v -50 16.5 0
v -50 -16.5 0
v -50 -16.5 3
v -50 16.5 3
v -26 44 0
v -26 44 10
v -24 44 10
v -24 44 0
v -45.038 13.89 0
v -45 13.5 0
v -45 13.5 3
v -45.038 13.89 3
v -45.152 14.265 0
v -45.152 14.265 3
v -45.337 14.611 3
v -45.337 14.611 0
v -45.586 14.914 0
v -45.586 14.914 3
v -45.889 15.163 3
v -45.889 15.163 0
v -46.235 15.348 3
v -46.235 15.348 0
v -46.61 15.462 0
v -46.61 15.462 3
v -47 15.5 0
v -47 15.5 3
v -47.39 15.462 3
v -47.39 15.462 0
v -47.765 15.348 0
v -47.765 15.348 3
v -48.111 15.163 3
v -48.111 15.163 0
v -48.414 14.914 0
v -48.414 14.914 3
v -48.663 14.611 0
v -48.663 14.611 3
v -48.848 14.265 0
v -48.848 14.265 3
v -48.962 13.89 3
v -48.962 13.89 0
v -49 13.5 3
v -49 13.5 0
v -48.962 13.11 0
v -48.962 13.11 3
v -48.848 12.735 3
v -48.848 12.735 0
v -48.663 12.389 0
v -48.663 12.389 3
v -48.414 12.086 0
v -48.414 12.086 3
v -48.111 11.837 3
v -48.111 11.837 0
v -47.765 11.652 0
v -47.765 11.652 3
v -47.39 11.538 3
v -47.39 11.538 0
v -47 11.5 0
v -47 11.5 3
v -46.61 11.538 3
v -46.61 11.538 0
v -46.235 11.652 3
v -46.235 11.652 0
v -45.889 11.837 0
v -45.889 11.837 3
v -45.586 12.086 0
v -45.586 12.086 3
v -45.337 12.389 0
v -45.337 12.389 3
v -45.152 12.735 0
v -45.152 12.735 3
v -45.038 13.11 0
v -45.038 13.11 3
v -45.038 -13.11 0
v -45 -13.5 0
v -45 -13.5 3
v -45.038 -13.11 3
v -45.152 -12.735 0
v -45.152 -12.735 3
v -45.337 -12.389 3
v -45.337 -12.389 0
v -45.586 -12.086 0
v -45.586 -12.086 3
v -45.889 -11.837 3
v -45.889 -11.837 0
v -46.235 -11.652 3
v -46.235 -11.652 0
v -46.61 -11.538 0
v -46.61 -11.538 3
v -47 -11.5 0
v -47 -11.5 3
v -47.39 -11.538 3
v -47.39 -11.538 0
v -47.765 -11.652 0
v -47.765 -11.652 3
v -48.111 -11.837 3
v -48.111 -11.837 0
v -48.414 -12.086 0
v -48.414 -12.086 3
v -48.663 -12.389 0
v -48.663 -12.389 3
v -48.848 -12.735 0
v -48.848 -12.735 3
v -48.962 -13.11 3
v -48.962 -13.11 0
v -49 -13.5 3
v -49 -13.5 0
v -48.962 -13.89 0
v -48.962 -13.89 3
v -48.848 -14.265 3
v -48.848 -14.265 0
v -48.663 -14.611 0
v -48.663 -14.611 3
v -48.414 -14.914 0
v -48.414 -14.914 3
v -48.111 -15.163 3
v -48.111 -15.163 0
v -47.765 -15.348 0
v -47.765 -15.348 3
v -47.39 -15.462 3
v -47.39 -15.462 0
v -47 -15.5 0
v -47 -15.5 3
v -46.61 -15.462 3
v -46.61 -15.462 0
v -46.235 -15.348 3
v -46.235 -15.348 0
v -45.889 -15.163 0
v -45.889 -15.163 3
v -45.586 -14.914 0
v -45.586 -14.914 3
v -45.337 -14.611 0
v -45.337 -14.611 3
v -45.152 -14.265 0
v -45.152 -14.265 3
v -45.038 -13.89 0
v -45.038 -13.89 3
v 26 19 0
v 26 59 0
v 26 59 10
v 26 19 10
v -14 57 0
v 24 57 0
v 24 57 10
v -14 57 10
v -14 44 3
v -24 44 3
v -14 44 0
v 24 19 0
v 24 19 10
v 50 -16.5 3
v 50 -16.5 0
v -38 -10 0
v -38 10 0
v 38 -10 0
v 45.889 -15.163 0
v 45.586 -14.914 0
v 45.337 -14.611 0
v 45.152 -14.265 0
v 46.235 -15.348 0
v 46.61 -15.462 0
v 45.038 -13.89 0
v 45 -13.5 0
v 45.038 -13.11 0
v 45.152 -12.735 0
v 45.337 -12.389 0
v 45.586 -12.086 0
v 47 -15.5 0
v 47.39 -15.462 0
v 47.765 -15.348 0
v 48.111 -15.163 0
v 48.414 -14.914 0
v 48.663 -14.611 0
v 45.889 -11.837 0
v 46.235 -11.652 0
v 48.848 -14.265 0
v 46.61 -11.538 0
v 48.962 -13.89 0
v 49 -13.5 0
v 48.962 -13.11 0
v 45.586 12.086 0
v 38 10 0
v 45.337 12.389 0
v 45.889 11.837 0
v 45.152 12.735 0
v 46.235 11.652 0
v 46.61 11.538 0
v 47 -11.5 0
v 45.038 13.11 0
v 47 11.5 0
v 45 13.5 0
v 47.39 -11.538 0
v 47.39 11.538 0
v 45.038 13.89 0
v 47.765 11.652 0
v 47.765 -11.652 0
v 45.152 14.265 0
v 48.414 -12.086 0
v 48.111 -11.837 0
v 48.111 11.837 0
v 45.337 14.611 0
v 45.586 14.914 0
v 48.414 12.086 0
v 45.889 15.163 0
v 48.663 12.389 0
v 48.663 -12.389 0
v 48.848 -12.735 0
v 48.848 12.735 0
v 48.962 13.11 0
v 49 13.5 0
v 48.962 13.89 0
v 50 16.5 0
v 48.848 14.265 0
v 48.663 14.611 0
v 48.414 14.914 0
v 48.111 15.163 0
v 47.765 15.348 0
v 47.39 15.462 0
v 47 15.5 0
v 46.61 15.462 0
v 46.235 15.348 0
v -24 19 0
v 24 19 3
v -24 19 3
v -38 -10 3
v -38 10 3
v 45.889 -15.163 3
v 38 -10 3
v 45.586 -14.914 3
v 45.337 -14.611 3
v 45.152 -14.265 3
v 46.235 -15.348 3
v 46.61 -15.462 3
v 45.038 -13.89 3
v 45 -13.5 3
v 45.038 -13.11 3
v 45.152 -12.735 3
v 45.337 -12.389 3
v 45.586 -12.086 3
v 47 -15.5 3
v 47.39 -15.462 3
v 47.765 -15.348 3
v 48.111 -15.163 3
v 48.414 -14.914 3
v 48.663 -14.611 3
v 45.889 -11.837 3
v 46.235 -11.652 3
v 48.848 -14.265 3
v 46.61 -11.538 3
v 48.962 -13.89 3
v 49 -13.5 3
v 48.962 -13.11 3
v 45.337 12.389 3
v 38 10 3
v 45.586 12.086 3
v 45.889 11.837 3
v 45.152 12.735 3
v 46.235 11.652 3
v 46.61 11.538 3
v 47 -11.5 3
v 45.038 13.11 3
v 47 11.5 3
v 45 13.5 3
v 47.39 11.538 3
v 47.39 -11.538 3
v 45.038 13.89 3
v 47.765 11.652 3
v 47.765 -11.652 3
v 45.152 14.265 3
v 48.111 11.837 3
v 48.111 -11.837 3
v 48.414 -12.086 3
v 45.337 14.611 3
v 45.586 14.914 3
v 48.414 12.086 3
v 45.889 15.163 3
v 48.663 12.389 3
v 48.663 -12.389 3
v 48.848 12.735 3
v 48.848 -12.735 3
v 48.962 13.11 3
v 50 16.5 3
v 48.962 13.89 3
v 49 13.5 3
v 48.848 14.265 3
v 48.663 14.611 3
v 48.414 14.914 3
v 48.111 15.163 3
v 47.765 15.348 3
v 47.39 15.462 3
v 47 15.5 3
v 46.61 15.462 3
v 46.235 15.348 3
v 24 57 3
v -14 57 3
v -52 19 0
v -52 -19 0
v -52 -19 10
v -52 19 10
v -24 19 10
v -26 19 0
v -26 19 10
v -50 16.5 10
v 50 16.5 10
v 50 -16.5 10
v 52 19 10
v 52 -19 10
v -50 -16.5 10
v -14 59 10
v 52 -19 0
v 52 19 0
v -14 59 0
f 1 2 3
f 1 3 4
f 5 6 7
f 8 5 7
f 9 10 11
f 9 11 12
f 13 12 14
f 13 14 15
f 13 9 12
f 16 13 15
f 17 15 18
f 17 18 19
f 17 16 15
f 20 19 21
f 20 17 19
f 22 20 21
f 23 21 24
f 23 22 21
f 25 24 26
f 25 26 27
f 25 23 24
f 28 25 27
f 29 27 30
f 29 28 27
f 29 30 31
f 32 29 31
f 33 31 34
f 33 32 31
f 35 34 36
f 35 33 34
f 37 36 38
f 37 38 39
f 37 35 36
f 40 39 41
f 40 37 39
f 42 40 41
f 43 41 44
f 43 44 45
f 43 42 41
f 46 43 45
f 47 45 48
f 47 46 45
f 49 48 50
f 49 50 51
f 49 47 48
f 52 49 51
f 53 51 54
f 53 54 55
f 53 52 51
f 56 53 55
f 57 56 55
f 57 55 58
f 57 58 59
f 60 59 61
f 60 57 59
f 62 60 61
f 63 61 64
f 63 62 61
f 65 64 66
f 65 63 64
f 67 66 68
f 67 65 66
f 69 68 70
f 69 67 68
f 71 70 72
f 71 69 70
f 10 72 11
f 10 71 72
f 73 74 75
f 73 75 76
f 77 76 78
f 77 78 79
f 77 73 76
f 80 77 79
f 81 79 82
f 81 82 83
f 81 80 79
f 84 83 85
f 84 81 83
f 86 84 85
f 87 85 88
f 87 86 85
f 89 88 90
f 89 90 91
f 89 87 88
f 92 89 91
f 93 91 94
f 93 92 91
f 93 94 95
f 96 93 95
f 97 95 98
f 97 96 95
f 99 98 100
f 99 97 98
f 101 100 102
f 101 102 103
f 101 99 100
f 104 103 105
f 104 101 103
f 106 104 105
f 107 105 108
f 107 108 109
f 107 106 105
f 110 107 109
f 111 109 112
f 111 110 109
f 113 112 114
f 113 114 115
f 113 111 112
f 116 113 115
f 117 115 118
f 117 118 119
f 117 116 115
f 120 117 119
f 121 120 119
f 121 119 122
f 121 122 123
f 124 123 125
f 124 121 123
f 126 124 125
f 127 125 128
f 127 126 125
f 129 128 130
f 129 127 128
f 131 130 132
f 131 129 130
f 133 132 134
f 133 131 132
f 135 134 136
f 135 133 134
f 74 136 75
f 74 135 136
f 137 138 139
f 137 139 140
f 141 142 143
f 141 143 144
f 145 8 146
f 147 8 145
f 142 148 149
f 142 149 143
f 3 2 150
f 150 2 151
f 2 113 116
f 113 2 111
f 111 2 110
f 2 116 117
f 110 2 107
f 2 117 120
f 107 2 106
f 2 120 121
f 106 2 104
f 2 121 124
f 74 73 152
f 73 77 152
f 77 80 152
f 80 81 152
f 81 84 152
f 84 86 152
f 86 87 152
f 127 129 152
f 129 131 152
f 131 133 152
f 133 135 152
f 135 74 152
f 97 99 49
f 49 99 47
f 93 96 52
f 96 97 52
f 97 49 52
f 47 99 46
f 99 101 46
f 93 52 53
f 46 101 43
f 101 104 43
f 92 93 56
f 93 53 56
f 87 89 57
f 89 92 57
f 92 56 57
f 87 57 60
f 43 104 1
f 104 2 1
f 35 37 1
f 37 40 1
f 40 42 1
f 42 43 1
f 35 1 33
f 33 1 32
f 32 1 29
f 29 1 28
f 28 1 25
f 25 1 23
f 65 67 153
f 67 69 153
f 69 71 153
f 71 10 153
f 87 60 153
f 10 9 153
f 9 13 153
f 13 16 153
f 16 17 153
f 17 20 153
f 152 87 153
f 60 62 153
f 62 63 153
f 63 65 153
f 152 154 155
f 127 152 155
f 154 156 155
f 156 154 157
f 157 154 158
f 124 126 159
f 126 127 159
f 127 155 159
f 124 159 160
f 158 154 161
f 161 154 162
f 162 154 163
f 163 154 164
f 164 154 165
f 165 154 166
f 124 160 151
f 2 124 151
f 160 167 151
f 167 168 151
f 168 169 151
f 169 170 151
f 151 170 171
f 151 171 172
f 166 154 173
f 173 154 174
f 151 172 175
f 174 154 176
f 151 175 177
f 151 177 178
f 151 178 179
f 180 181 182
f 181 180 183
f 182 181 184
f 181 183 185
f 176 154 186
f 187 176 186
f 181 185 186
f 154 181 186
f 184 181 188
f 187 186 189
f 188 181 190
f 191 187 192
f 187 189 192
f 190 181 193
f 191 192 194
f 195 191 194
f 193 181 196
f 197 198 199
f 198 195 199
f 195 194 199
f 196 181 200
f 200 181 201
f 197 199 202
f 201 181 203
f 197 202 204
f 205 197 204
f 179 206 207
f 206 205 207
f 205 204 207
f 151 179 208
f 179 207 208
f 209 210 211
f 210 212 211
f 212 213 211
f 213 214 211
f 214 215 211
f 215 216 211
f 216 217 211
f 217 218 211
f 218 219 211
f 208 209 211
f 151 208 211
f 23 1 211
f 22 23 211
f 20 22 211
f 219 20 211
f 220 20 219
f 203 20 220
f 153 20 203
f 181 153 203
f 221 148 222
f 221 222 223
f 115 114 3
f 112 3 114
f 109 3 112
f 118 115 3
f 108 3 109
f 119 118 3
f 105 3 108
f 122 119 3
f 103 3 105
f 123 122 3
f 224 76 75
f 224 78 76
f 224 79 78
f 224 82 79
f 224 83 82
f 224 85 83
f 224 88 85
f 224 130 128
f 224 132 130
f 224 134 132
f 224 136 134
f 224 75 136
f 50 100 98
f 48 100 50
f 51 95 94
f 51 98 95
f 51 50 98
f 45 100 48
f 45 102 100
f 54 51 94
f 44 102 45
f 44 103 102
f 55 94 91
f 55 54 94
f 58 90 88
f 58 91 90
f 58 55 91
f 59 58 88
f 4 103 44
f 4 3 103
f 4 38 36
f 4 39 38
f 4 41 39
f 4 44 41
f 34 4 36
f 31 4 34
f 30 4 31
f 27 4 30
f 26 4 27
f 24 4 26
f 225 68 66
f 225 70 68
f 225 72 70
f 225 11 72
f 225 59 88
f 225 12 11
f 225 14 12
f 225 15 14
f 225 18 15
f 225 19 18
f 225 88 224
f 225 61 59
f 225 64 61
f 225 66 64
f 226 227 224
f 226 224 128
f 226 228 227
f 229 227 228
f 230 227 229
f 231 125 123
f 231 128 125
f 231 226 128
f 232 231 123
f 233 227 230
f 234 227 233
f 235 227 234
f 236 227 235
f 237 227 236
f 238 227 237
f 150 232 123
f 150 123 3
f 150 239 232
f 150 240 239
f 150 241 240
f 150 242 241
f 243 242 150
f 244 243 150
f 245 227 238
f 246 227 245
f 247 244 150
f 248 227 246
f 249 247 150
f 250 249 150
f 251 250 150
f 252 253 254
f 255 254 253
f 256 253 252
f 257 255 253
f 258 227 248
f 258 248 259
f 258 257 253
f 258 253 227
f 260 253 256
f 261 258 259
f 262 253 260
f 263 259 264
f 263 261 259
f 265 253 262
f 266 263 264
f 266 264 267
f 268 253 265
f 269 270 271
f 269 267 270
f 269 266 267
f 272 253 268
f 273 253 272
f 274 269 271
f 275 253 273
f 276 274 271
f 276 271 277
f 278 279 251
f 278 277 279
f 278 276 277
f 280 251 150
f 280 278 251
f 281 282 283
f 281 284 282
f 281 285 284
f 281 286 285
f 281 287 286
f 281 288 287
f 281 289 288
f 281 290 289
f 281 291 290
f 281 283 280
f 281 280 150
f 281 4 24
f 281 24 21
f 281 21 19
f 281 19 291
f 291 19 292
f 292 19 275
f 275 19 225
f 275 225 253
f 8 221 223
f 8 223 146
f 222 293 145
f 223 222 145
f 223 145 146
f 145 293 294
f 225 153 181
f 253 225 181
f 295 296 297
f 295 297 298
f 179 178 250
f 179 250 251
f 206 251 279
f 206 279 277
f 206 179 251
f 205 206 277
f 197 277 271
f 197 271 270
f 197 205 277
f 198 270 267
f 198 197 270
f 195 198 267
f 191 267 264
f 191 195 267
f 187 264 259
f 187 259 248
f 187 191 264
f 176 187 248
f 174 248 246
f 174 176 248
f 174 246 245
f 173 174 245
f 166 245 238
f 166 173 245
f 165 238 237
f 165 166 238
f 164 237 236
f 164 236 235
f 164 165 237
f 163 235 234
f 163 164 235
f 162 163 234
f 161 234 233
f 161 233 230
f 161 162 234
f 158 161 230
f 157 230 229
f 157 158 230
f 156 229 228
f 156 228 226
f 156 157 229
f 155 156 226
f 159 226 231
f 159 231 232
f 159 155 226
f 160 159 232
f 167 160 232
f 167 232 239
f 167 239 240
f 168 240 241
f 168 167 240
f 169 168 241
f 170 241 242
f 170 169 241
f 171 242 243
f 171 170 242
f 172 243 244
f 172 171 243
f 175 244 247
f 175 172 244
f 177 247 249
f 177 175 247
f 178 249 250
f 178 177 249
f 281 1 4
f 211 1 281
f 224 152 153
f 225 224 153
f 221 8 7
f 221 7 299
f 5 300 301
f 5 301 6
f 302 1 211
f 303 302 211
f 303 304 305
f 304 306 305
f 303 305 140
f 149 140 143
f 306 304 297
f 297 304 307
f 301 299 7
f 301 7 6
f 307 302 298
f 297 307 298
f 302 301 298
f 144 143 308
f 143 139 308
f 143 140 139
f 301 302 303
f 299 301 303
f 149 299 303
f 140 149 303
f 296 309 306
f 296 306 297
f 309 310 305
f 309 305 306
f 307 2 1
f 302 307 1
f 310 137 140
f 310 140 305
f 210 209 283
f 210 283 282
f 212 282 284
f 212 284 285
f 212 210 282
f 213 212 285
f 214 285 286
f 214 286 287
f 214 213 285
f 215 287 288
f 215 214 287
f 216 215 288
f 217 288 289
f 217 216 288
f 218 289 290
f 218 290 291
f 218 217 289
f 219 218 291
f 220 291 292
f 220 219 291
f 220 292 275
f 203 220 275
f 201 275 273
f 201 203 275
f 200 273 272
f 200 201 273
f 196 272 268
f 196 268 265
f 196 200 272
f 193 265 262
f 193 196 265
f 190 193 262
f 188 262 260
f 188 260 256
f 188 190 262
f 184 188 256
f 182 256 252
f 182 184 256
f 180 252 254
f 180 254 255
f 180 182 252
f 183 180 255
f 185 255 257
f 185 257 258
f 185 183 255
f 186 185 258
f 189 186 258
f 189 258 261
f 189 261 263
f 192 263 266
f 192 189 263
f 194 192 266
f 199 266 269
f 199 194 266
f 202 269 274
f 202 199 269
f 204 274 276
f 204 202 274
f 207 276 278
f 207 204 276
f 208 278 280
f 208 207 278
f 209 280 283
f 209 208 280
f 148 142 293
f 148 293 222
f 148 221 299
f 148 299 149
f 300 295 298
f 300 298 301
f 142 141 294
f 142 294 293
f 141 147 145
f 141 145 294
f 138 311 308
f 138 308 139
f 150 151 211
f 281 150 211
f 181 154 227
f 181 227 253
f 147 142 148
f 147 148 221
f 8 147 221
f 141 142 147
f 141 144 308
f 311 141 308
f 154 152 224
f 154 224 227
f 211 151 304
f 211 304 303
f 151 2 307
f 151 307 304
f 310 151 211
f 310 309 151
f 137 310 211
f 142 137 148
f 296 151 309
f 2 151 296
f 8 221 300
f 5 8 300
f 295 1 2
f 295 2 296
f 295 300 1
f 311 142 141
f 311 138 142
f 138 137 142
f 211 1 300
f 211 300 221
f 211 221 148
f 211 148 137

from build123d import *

# Parameters (mm, degrees)
SKETCH_W     = 100
SKETCH_H     = 33
SKETCH_R     = 2
SKETCH_W_2   = 76
SKETCH_H_2   = 20
PAD_DEPTH    = 3
PAD001_DEPTH = 3
SKETCH002_W  = 100
SKETCH002_H  = 33
PAD002_DEPTH = 10


with BuildPart() as boardholder:
    # Sketch → Pad (new body)
    with BuildSketch(Plane.XY):
        Rectangle(SKETCH_W, SKETCH_H)
        with Locations((-47, 13.5)):
            Circle(SKETCH_R, mode=Mode.SUBTRACT)
        with Locations((-47, -13.5)):
            Circle(SKETCH_R, mode=Mode.SUBTRACT)
        with Locations((47, 13.5)):
            Circle(SKETCH_R, mode=Mode.SUBTRACT)
        with Locations((47, -13.5)):
            Circle(SKETCH_R, mode=Mode.SUBTRACT)
        Rectangle(SKETCH_W_2, SKETCH_H_2, mode=Mode.SUBTRACT)
    extrude(amount=PAD_DEPTH)


with BuildPart() as pmsholder:
    # Sketch001 → Pad001 (new body)
    with BuildSketch(Plane.XY):
        Polygon((-14, 57), (24, 57), (24, 19), (-24, 19), (-24, 44), (-14, 44), align=None)
    extrude(amount=PAD001_DEPTH)


with BuildPart() as casewalls:
    # Sketch002 → Pad002 (new body)
    with BuildSketch(Plane.XY):
        Polygon((-14, 59), (26, 59), (26, 19), (52, 19), (52, -19), (-52, -19), (-52, 19), (-26, 19), (-26, 44), (-24, 44), (-24, 19), (24, 19), (24, 57), (-14, 57), align=None)
        Rectangle(SKETCH002_W, SKETCH002_H, mode=Mode.SUBTRACT)
    extrude(amount=PAD002_DEPTH)


solid = Compound([boardholder.part, pmsholder.part, casewalls.part])
